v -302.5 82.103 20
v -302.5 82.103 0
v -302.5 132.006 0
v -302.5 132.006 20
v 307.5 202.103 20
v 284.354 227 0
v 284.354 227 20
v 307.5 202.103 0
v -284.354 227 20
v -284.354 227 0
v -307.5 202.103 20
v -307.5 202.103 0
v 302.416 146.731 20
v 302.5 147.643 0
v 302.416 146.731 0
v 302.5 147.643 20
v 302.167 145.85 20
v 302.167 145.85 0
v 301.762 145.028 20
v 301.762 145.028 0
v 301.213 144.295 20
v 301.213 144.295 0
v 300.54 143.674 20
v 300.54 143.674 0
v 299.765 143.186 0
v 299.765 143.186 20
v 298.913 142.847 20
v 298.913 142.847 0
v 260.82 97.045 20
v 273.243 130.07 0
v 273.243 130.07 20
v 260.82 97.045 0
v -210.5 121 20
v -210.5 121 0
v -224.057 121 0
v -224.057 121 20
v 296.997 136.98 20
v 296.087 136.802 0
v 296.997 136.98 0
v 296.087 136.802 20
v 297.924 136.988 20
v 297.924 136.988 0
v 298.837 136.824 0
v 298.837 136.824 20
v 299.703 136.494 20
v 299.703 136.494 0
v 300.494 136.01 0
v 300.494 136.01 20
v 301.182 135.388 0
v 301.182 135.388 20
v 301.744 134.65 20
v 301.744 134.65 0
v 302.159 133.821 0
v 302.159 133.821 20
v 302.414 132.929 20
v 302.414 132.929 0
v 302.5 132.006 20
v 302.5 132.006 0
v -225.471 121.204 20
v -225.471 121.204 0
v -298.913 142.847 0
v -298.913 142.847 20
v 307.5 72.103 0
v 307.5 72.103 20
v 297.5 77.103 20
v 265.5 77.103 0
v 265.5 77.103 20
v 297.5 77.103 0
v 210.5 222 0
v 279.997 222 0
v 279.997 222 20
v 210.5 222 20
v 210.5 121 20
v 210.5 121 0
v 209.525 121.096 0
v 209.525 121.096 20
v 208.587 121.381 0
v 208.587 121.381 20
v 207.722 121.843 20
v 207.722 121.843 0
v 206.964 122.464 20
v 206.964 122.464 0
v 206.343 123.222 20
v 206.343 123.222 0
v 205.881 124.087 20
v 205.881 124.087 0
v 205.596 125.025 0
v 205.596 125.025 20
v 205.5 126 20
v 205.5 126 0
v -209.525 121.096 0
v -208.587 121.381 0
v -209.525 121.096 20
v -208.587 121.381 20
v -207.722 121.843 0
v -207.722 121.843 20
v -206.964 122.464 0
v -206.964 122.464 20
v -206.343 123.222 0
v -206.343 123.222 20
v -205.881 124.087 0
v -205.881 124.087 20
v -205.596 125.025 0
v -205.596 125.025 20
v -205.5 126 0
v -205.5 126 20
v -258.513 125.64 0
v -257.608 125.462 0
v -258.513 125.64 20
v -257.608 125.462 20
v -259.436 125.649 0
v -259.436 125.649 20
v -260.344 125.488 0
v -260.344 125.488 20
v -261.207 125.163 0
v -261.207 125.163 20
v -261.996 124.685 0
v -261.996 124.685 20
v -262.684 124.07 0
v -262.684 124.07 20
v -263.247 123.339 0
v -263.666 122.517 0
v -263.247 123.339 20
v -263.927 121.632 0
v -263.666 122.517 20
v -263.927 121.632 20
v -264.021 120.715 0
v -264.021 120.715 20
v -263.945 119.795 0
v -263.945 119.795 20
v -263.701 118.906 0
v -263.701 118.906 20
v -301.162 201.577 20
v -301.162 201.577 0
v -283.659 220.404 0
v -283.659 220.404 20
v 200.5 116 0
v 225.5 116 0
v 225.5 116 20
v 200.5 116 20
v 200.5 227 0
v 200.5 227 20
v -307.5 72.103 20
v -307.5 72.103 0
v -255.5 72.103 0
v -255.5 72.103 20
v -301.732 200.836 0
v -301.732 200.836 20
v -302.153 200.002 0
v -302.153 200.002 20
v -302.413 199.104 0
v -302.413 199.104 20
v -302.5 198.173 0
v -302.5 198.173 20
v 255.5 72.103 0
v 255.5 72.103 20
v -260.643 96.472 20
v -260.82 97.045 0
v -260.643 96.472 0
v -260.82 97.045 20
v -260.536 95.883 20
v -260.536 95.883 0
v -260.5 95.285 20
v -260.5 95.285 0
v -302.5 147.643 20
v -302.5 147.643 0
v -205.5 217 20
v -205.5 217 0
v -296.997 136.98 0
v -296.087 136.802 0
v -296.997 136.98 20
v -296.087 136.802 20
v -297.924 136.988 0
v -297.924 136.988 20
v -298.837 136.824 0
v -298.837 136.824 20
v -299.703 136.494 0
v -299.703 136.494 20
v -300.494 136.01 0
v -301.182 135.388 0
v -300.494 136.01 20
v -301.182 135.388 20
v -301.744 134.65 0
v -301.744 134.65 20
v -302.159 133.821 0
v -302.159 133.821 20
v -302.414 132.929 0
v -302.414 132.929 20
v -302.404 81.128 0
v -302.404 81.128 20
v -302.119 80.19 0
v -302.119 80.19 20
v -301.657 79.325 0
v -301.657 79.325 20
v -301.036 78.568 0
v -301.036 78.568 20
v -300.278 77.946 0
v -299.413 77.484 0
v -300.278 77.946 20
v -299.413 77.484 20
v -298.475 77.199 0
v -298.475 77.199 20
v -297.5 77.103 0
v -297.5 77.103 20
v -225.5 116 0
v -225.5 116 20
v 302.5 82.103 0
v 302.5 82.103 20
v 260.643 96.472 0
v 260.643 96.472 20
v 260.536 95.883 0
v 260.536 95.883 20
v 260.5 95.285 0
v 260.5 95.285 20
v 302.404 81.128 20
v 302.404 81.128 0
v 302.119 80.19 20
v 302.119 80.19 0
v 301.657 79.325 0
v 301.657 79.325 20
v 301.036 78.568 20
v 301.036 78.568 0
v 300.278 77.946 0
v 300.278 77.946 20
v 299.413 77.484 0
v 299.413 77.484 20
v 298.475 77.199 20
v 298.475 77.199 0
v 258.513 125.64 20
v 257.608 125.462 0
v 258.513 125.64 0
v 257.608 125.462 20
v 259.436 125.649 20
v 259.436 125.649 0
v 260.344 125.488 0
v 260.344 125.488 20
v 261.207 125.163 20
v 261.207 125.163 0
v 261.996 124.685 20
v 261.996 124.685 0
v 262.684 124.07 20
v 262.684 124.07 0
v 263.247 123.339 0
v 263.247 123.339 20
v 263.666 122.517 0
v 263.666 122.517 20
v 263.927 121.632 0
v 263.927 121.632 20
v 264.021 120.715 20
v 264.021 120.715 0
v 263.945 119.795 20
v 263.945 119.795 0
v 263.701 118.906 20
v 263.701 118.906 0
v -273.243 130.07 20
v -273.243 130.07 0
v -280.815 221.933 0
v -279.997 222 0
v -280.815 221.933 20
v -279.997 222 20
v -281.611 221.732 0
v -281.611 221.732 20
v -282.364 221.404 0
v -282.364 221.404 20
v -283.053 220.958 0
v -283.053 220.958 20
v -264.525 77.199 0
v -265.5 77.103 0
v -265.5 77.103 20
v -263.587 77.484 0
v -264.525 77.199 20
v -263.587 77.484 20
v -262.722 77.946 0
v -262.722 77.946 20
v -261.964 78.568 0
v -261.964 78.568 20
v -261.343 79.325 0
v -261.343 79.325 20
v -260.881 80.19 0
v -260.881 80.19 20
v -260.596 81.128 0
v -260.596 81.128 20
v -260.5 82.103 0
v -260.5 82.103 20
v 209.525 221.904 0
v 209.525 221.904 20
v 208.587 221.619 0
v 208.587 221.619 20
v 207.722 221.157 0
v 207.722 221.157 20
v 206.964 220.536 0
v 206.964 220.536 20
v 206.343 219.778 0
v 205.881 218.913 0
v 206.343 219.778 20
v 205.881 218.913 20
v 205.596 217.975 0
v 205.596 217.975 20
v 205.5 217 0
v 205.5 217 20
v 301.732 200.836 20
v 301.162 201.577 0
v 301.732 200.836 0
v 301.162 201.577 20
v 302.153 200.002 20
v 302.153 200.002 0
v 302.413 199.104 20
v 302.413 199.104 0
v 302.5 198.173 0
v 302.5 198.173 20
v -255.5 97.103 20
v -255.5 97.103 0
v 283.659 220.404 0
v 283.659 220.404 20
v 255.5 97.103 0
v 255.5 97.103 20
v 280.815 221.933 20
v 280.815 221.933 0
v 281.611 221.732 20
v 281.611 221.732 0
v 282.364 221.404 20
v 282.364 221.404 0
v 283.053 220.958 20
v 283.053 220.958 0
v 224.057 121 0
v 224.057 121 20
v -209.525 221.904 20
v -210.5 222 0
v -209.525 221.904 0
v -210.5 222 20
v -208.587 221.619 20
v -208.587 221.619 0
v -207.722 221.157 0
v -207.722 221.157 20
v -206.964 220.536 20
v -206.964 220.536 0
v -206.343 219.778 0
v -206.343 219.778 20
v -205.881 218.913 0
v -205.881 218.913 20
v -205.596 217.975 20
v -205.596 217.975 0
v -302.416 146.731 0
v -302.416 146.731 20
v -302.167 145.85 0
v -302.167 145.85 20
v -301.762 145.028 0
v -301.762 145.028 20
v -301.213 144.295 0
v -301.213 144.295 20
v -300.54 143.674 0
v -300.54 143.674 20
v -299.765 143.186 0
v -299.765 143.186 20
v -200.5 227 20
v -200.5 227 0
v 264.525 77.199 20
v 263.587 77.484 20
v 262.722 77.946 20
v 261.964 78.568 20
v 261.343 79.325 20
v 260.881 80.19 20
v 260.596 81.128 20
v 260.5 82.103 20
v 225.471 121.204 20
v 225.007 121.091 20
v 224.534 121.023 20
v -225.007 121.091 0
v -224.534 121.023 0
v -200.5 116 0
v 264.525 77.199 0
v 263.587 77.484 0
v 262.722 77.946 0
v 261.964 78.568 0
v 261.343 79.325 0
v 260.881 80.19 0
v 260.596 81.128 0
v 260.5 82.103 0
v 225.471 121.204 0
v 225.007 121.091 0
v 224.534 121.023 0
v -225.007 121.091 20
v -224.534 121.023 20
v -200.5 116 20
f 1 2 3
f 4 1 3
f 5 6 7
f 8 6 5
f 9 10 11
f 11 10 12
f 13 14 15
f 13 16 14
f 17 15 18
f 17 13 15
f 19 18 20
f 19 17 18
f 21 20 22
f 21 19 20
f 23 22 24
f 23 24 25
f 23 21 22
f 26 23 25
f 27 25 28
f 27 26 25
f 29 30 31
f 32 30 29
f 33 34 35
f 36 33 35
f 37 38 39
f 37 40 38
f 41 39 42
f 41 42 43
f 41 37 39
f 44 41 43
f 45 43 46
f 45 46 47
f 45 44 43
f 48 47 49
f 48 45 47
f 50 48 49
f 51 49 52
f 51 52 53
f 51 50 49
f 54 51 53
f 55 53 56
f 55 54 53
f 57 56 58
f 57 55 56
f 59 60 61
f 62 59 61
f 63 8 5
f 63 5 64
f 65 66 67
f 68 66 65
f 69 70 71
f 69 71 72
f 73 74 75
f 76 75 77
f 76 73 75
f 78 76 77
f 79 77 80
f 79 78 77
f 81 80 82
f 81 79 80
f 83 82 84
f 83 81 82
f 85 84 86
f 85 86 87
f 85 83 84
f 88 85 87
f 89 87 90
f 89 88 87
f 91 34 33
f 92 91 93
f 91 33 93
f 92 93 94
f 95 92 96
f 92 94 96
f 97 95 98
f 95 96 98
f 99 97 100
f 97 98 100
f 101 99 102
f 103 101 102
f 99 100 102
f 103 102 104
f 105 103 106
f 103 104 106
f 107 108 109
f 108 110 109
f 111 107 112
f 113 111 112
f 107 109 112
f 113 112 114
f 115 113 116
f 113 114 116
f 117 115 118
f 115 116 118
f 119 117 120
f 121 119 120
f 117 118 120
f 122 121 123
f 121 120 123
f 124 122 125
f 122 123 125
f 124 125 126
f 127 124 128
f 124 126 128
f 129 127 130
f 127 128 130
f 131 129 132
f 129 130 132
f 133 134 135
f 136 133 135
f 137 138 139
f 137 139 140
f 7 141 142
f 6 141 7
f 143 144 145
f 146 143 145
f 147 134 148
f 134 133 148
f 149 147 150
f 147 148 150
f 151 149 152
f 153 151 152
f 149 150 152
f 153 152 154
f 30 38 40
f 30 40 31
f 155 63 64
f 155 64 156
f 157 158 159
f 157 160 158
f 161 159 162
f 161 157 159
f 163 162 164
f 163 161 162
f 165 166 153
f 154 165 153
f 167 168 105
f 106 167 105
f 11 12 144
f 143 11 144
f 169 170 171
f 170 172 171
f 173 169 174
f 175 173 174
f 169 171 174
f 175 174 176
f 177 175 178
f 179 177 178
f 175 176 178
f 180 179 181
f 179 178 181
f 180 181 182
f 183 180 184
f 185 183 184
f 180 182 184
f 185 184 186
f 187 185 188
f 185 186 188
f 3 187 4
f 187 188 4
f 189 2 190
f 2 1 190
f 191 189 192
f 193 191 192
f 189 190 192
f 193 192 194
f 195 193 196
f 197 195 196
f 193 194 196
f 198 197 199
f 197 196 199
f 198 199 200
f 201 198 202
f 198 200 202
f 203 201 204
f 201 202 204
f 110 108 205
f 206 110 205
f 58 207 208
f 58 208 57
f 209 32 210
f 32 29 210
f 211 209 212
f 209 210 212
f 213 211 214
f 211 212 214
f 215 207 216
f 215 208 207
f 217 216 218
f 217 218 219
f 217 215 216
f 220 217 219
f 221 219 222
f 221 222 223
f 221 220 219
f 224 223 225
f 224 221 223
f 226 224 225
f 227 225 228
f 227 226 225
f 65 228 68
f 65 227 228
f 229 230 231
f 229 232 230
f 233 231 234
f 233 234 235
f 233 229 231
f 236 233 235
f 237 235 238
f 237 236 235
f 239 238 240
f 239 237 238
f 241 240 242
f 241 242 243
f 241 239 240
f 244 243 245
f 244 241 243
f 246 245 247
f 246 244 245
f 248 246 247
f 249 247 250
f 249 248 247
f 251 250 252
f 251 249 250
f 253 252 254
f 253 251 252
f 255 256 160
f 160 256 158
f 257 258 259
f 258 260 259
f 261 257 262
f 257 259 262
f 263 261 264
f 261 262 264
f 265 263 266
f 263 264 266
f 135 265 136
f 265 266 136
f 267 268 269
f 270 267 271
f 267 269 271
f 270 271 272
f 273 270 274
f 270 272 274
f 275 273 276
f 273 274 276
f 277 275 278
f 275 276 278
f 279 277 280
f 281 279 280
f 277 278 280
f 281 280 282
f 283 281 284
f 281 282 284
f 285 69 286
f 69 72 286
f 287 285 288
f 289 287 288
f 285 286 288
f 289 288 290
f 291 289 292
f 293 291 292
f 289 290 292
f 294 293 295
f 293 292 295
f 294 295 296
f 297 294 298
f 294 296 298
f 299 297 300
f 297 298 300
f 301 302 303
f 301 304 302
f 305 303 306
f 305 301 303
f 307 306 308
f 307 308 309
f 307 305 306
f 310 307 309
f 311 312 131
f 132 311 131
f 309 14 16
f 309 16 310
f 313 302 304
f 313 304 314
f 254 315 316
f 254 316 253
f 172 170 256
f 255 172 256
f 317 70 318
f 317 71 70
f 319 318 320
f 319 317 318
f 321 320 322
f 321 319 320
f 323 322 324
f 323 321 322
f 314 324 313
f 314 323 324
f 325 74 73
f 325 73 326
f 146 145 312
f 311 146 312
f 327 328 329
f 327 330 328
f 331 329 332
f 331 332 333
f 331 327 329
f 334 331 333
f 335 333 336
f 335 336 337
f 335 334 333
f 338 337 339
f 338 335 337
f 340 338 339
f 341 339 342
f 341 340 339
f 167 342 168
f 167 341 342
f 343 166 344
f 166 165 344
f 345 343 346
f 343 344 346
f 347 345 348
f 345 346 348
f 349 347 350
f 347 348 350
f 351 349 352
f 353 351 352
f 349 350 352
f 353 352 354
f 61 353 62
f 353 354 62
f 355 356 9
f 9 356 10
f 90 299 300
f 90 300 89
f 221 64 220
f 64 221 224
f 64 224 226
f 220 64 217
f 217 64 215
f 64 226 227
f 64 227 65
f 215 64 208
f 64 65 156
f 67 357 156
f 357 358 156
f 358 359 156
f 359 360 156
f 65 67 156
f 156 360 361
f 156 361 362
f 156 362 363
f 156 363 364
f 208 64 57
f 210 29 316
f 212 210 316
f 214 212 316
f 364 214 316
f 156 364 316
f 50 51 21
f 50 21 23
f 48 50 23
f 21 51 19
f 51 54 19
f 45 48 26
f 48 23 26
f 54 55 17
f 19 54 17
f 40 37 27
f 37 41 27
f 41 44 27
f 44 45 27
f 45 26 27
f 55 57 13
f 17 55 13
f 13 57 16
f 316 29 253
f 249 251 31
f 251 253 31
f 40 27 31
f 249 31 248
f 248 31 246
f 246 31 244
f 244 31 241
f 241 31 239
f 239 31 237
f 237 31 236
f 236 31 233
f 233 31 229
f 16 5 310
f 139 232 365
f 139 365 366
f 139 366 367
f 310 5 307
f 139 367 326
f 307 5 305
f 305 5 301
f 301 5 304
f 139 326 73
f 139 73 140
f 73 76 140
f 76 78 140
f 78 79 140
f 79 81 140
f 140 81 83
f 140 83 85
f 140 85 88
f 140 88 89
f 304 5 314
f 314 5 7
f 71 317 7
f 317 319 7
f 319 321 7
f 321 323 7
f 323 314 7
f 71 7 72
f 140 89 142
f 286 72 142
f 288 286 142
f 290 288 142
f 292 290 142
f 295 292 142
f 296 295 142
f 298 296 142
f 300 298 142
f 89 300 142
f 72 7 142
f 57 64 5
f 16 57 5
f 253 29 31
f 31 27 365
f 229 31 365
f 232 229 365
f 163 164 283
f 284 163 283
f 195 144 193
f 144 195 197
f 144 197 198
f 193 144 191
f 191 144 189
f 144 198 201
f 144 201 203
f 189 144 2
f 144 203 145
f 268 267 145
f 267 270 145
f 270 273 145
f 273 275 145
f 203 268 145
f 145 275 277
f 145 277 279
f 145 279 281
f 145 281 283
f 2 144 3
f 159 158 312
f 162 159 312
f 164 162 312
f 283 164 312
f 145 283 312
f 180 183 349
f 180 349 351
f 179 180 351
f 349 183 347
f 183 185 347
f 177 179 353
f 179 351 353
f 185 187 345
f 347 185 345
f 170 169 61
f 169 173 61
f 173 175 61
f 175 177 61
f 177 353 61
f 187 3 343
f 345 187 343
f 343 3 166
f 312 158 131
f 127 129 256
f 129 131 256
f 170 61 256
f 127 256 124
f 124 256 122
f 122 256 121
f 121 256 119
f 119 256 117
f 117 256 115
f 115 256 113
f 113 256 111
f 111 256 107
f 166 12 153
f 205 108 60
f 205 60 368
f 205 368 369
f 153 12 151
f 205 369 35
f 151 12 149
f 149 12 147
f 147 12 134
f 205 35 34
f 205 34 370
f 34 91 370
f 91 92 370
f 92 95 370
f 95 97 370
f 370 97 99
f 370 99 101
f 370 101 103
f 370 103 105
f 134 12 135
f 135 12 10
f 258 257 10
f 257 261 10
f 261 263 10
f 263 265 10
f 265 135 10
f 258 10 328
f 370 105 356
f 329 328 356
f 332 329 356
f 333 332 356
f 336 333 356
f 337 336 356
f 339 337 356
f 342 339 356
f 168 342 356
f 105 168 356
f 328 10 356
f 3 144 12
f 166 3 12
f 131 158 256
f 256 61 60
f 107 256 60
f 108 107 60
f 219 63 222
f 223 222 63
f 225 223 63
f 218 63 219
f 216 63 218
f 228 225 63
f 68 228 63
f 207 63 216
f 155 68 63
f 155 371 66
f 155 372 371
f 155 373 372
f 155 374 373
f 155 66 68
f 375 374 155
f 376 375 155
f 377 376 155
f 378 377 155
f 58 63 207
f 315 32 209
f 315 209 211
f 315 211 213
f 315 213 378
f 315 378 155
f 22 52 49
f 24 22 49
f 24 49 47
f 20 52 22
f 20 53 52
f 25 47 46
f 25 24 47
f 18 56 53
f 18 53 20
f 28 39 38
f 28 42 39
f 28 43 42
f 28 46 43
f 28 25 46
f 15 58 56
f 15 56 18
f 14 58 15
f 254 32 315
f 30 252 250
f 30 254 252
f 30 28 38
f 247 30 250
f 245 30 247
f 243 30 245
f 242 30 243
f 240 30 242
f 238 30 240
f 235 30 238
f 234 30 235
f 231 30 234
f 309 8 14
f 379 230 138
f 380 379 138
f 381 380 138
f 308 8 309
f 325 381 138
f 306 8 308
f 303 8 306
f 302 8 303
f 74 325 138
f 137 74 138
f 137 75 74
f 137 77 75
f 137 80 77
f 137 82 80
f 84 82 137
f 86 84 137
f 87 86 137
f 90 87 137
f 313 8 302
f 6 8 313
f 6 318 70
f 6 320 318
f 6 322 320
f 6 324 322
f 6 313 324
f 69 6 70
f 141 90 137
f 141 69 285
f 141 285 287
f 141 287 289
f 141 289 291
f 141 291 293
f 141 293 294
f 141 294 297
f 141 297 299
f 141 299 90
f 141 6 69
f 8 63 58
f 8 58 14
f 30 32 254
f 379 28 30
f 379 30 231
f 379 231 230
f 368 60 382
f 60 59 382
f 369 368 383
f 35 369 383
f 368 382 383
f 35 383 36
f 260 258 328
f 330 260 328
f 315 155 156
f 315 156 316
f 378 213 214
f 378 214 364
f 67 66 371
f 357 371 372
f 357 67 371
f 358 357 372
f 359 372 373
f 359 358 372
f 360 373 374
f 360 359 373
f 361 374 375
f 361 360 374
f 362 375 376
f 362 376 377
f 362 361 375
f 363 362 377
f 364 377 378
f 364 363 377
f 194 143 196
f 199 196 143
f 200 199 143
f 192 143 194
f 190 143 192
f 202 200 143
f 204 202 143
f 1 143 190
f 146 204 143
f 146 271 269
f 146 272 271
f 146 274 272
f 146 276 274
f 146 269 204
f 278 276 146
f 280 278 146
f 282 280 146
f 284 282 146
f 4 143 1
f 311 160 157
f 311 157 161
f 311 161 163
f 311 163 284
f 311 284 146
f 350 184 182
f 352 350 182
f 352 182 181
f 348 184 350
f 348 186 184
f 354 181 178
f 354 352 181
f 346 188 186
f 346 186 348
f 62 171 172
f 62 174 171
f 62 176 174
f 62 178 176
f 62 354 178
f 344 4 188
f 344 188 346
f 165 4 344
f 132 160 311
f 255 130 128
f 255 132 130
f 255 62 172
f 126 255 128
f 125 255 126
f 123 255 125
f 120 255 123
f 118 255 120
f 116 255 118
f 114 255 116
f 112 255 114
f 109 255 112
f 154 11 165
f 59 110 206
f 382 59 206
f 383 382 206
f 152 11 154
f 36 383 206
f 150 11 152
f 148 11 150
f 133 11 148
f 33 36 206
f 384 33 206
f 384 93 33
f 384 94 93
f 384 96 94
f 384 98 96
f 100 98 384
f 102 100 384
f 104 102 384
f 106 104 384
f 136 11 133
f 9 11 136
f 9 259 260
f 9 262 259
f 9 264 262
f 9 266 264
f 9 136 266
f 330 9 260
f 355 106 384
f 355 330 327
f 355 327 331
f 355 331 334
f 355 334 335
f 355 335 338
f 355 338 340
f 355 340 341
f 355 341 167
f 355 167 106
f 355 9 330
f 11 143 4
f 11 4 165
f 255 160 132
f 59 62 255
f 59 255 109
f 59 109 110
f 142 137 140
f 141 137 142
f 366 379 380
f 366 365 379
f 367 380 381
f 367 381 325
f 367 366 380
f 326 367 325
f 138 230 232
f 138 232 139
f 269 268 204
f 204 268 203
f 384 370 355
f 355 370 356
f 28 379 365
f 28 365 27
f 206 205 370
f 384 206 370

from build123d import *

# Parameters (mm, degrees)
F1_DEPTH = 20
F2_R     = 5


with BuildPart() as f1:
    # F0 (on Top) → F1 (new body)
    with BuildSketch(Plane.XY):
        Polygon((-267.234735, 128.299134), (-225.5, 116), (-200.5, 116), (-200.5, 227), (-284.354419, 227), (-307.5, 202.103093), (-307.5, 72.103093), (-255.5, 72.103093), (-255.5, 97.103093), align=None)
        Polygon((-273.242781, 130.069692), (-260.5, 96.193827), (-260.5, 77.103093), (-302.5, 77.103093), (-302.5, 138.691729), align=None, mode=Mode.SUBTRACT)
        Polygon((-205.5, 222.000003), (-205.5, 120.999999), (-224.778584, 120.999999), (-302.5, 143.904328), (-302.5, 200.137961), (-282.175801, 222.000003), align=None, mode=Mode.SUBTRACT)
    extrude(amount=F1_DEPTH)

    # F2
    f2_edges = [f1.edges().sort_by_distance(p)[0] for p in [
        (-267.234735, 128.299134, 10),
        (-205.5, 120.999999, 10),
        (-260.5, 96.193827, 10),
        (-260.5, 77.103093, 10),
        (-224.778584, 120.999999, 10),
        (-282.175801, 222.000003, 10),
        (-302.5, 200.137961, 10),
        (-302.5, 138.691729, 10),
        (-302.5, 77.103093, 10),
        (-302.5, 143.904328, 10),
        (-205.5, 222.000003, 10),
    ]]
    fillet(f2_edges, radius=F2_R)


with BuildPart() as f3_1:
    # F3: instance of F1
    add(f1.part.mirror(Plane.YZ))


solid = Compound([f1.part, f3_1.part])
